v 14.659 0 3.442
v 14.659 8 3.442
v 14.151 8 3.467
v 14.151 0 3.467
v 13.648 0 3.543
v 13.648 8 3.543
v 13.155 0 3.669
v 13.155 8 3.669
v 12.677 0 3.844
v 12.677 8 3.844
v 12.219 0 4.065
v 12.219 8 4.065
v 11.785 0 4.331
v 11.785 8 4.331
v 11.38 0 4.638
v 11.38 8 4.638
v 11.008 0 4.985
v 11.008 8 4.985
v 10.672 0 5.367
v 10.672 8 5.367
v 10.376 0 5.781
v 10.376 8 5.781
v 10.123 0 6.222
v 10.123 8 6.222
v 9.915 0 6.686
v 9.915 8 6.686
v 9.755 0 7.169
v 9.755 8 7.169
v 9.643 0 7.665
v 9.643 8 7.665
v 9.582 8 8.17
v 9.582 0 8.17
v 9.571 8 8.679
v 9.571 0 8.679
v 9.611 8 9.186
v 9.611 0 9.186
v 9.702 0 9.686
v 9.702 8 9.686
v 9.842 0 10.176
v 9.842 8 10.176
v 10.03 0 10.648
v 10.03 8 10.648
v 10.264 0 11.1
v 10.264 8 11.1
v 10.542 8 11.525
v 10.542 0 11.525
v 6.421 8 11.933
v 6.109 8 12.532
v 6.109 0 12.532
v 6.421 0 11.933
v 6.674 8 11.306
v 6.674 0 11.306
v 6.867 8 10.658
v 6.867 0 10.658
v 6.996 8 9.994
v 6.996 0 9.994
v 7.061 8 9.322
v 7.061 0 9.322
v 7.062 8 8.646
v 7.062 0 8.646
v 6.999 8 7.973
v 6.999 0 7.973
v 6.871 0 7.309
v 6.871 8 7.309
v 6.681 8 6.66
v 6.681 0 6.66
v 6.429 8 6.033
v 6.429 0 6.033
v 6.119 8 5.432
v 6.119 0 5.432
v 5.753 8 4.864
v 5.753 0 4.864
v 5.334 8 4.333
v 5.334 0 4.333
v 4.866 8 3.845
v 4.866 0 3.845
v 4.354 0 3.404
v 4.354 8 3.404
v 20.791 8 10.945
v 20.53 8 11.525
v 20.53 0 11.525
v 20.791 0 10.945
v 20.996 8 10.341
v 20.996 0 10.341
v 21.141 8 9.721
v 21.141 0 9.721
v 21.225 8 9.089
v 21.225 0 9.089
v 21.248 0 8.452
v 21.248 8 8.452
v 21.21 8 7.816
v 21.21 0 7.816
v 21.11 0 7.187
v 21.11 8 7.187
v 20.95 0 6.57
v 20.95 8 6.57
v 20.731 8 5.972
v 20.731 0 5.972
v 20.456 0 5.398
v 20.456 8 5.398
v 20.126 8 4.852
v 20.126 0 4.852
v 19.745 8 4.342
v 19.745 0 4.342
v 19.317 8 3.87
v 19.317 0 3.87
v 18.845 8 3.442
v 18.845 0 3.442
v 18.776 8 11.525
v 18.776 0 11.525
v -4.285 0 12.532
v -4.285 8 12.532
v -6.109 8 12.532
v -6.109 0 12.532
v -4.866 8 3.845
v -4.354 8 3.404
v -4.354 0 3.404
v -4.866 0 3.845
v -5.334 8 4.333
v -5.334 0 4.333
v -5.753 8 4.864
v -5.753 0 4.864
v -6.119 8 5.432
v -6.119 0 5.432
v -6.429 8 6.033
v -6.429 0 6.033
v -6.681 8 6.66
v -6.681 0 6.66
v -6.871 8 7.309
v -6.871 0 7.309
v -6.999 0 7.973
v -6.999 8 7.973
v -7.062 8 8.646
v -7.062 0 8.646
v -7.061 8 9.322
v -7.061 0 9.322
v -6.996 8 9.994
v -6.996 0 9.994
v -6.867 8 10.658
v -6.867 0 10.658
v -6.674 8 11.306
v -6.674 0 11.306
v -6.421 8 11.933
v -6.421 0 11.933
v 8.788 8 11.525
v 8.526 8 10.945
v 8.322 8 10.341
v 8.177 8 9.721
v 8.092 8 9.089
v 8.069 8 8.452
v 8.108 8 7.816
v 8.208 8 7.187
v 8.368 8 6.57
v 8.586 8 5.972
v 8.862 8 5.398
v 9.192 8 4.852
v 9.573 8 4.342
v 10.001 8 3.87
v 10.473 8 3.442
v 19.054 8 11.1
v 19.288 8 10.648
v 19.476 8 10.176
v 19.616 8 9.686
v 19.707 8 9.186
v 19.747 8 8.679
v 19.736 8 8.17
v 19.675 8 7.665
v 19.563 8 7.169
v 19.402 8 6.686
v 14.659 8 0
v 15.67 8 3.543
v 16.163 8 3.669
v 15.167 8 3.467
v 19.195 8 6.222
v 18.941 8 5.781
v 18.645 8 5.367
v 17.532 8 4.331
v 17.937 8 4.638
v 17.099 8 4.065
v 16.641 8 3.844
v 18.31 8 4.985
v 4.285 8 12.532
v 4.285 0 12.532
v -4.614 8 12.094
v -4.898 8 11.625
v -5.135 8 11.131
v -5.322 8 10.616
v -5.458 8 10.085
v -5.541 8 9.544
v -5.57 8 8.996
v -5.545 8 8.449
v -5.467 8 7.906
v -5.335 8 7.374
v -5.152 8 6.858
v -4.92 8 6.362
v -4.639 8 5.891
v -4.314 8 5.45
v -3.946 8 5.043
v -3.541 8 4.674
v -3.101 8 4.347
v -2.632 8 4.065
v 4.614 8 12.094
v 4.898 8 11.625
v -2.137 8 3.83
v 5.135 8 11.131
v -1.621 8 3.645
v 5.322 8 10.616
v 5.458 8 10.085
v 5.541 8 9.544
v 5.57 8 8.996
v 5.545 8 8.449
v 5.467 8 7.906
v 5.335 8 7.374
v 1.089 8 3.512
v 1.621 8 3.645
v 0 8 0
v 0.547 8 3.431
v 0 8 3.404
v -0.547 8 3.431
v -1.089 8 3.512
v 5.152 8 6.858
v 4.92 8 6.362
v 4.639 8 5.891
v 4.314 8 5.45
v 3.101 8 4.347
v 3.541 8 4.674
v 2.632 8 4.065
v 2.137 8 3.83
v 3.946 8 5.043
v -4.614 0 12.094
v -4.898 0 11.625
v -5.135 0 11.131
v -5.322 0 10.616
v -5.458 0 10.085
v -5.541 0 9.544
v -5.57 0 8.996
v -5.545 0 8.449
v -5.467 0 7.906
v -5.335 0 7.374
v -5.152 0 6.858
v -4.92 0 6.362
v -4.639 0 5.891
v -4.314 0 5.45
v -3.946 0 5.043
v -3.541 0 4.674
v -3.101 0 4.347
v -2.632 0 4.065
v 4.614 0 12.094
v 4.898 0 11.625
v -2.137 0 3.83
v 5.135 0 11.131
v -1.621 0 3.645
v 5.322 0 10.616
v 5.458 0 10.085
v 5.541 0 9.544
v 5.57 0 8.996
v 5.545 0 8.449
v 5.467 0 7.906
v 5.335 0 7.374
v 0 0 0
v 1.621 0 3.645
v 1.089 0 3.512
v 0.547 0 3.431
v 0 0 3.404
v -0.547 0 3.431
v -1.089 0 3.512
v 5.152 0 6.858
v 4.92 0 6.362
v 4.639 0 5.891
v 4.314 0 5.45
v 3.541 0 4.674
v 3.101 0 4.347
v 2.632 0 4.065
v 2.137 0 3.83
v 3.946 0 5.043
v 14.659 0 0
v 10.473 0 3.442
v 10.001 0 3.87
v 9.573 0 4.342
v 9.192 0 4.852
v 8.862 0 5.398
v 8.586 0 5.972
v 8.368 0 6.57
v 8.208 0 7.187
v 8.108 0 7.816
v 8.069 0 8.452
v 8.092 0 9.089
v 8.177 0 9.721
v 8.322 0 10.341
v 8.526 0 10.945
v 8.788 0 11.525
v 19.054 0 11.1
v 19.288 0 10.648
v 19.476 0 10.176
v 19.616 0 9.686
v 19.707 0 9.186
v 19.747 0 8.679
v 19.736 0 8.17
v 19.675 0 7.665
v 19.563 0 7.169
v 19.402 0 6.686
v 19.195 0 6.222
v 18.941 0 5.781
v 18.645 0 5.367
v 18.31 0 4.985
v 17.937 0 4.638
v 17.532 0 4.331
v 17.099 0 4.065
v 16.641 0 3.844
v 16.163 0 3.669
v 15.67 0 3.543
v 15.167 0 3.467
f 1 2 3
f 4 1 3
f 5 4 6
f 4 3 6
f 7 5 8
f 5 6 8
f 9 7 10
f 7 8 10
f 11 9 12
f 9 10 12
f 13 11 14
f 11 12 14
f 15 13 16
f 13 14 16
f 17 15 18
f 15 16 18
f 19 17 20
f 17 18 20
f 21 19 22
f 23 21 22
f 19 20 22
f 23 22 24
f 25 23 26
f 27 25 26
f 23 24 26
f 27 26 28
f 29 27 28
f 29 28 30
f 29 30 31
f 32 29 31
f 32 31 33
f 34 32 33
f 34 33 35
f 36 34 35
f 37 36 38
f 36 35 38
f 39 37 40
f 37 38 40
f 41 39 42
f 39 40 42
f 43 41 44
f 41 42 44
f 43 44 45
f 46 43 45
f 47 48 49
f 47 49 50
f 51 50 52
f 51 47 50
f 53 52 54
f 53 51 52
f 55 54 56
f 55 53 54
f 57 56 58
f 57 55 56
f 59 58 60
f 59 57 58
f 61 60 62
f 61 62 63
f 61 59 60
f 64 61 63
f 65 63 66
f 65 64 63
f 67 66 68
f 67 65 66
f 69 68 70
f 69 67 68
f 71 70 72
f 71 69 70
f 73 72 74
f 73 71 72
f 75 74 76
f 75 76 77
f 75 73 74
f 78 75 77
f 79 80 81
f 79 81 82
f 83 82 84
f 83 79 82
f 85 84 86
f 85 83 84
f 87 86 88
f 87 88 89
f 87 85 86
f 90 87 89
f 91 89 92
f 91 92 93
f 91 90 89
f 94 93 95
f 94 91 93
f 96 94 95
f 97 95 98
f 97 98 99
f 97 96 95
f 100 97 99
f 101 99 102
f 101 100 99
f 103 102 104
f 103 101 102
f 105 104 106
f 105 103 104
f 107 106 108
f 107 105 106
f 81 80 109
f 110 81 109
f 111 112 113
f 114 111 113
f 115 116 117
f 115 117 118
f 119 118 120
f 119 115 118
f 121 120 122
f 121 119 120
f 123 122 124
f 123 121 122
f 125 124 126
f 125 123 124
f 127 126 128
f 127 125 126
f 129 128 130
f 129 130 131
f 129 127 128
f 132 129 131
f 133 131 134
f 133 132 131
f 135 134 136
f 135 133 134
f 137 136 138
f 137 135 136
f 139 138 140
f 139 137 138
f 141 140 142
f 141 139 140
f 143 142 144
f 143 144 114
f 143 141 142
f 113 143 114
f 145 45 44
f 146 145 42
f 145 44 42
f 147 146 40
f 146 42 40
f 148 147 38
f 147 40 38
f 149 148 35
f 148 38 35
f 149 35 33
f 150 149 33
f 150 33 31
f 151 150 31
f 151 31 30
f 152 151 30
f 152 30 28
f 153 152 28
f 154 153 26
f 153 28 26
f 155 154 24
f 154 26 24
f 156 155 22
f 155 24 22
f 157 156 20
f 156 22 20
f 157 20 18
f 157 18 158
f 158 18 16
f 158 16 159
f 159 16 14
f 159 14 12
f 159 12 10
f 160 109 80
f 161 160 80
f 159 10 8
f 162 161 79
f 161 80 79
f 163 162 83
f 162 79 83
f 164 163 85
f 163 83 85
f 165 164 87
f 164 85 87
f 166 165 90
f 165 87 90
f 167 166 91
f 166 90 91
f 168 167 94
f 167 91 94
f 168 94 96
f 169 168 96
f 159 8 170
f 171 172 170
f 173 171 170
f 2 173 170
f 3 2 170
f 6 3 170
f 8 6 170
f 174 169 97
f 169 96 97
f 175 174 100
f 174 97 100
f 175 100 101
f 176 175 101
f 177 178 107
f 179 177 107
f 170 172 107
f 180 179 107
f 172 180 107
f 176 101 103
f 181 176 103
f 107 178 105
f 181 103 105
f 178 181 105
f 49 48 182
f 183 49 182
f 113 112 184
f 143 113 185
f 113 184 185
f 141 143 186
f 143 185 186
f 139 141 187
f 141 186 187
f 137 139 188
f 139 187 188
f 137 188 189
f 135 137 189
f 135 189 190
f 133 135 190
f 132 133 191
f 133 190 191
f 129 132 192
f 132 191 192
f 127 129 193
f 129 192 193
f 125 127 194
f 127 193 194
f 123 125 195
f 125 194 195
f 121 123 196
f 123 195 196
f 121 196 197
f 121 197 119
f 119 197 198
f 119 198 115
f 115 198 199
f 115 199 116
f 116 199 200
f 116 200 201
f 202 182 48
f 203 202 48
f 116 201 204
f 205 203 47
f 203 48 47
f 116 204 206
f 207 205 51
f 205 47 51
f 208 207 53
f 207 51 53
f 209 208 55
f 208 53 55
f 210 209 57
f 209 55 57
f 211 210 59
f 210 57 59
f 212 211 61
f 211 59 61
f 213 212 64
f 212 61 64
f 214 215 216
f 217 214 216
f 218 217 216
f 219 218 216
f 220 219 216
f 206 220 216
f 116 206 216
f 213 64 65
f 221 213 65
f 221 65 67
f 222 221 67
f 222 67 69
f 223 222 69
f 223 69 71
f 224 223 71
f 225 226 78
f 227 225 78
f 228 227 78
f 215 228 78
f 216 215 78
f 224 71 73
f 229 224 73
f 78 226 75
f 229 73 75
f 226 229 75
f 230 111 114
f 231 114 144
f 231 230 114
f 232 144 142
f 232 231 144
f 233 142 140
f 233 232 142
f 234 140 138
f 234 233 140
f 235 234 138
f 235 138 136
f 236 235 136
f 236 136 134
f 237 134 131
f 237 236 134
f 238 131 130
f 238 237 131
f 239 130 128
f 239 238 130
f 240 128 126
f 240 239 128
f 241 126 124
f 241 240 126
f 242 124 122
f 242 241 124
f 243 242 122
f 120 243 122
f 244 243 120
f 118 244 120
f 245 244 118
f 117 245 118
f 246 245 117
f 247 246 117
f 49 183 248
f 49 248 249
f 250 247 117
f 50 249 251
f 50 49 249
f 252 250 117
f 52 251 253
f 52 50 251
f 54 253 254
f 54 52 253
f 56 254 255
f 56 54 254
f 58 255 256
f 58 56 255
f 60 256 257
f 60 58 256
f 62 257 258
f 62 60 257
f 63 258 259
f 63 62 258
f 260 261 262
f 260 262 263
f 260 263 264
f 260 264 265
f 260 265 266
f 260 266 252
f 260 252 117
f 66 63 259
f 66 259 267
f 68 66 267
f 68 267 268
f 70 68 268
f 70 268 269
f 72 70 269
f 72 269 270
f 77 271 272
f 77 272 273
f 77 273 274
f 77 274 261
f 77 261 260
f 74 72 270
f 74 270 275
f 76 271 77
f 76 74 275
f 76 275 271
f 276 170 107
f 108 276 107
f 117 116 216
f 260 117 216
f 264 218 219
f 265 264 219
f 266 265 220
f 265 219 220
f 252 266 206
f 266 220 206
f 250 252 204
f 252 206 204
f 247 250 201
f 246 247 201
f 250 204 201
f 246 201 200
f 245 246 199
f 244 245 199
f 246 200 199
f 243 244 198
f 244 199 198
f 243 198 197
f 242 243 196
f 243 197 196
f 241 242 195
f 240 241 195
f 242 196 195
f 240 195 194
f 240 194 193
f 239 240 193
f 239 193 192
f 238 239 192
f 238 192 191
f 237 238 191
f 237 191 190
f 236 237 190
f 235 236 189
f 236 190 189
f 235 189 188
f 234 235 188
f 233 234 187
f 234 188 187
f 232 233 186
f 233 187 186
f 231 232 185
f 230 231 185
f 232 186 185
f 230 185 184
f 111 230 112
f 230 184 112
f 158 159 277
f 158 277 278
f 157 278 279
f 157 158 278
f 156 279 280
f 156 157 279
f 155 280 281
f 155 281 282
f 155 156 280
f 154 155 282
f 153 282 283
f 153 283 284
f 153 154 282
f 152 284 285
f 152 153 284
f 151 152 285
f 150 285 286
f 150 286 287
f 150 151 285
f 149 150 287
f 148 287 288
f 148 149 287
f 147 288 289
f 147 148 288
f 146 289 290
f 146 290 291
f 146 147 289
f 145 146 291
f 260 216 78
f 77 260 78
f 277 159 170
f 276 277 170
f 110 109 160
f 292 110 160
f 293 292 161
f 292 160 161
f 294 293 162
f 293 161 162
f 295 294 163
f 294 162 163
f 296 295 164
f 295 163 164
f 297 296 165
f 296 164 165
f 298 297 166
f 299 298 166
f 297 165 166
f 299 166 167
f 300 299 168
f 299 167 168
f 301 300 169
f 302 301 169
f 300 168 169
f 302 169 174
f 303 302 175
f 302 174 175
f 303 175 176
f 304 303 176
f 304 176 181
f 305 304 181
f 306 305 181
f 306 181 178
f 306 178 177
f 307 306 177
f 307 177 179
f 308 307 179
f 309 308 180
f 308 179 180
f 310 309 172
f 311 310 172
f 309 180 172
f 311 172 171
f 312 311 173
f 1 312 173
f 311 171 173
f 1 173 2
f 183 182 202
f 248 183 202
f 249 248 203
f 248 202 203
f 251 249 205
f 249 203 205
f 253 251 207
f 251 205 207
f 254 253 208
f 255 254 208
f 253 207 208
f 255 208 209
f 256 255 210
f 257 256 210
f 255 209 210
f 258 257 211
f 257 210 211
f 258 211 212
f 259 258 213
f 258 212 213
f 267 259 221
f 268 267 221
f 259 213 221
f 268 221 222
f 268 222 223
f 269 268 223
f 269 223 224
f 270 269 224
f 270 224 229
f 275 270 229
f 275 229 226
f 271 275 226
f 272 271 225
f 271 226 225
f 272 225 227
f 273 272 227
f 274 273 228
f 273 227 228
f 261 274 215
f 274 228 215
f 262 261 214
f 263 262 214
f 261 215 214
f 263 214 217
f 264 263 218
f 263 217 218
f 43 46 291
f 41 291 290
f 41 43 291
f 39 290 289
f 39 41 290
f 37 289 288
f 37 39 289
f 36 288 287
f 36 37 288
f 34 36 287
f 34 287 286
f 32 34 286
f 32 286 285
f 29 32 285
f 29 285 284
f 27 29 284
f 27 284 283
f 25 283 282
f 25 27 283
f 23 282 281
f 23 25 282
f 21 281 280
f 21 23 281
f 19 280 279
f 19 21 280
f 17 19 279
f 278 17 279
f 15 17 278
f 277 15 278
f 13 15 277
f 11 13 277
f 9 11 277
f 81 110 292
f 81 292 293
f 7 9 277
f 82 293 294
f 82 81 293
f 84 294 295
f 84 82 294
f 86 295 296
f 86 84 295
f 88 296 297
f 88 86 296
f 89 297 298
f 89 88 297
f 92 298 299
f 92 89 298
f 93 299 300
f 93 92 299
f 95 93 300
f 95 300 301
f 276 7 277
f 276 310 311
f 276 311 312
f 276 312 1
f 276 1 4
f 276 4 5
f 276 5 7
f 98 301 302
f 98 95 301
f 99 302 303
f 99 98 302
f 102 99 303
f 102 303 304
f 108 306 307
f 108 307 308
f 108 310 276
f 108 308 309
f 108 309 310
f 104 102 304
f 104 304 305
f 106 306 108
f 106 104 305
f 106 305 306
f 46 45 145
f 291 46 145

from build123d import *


with BuildPart() as f3:
    # F3: sweep along a path in F2
    with BuildLine(Plane.XY) as f3_path:
        Line((0, 0), (0, 8))
    # F0 (on Front) → F3 (sweep)
    with BuildSketch(Plane.XZ):
        with BuildLine():
            Line((-4.285226, 12.532283), (-6.109268, 12.532283))
            ThreePointArc((-6.109268, 12.532283), (-6.942854, 7.639157), (-4.354308, 3.40395))
            Line((-4.354308, 3.40395), (0, 3.40395))
            ThreePointArc((0, 3.40395), (-5.042064, 6.606992), (-4.285226, 12.532283))
        make_face()
        with BuildLine():
            Line((0, 3.40395), (0, 1.90395))
            ThreePointArc((0, 1.90395), (2.302716, 2.28946), (4.354308, 3.40395))
            Line((4.354308, 3.40395), (0, 3.40395))
        make_face()
        with BuildLine():
            ThreePointArc((0, 1.90395), (-2.302716, 2.28946), (-4.354308, 3.40395))
            Line((-4.354308, 3.40395), (0, 0))
            Line((0, 0), (0, 1.90395))
        make_face()
        with BuildLine():
            ThreePointArc((4.354308, 3.40395), (2.302716, 2.28946), (0, 1.90395))
            Line((0, 1.90395), (0, 0))
            Line((0, 0), (4.354308, 3.40395))
        make_face()
        with BuildLine():
            Line((0, 3.40395), (-4.354308, 3.40395))
            ThreePointArc((-4.354308, 3.40395), (-2.302716, 2.28946), (0, 1.90395))
            Line((0, 1.90395), (0, 3.40395))
        make_face()
        with BuildLine():
            ThreePointArc((4.285226, 12.532283), (5.042064, 6.606992), (0, 3.40395))
            Line((0, 3.40395), (4.354308, 3.40395))
            ThreePointArc((4.354308, 3.40395), (6.942854, 7.639157), (6.109268, 12.532283))
            Line((6.109268, 12.532283), (4.285226, 12.532283))
        make_face()
    sweep(path=f3_path.line)


with BuildPart() as f4:
    # F4: sweep along a path in F2
    with BuildLine(Plane.XY) as f4_path:
        Line((14.658908, 0), (14.658908, 8))
    # F0 (on Front) → F4 (sweep)
    with BuildSketch(Plane.XZ):
        with BuildLine():
            Line((10.542163, 11.525456), (8.787998, 11.525456))
            ThreePointArc((8.787998, 11.525456), (8.207614, 7.187085), (10.473218, 3.442043))
            Line((10.473218, 3.442043), (14.658908, 3.442043))
            ThreePointArc((14.658908, 3.442043), (10.123239, 6.222105), (10.542163, 11.525456))
        make_face()
        with BuildLine():
            Line((14.658908, 3.442043), (14.658908, 1.942043))
            ThreePointArc((14.658908, 1.942043), (16.882081, 2.328367), (18.844597, 3.442043))
            Line((18.844597, 3.442043), (14.658908, 3.442043))
        make_face()
        with BuildLine():
            ThreePointArc((14.658908, 1.942043), (12.435734, 2.328367), (10.473218, 3.442043))
            Line((10.473218, 3.442043), (14.658908, 0))
            Line((14.658908, 0), (14.658908, 1.942043))
        make_face()
        with BuildLine():
            ThreePointArc((18.844597, 3.442043), (16.882081, 2.328367), (14.658908, 1.942043))
            Line((14.658908, 1.942043), (14.658908, 0))
            Line((14.658908, 0), (18.844597, 3.442043))
        make_face()
        with BuildLine():
            Line((14.658908, 3.442043), (10.473218, 3.442043))
            ThreePointArc((10.473218, 3.442043), (12.435734, 2.328367), (14.658908, 1.942043))
            Line((14.658908, 1.942043), (14.658908, 3.442043))
        make_face()
        with BuildLine():
            ThreePointArc((18.775652, 11.525456), (19.194576, 6.222105), (14.658908, 3.442043))
            Line((14.658908, 3.442043), (18.844597, 3.442043))
            ThreePointArc((18.844597, 3.442043), (21.110201, 7.187085), (20.529817, 11.525456))
            Line((20.529817, 11.525456), (18.775652, 11.525456))
        make_face()
    sweep(path=f4_path.line)


solid = Compound([f3.part, f4.part])
